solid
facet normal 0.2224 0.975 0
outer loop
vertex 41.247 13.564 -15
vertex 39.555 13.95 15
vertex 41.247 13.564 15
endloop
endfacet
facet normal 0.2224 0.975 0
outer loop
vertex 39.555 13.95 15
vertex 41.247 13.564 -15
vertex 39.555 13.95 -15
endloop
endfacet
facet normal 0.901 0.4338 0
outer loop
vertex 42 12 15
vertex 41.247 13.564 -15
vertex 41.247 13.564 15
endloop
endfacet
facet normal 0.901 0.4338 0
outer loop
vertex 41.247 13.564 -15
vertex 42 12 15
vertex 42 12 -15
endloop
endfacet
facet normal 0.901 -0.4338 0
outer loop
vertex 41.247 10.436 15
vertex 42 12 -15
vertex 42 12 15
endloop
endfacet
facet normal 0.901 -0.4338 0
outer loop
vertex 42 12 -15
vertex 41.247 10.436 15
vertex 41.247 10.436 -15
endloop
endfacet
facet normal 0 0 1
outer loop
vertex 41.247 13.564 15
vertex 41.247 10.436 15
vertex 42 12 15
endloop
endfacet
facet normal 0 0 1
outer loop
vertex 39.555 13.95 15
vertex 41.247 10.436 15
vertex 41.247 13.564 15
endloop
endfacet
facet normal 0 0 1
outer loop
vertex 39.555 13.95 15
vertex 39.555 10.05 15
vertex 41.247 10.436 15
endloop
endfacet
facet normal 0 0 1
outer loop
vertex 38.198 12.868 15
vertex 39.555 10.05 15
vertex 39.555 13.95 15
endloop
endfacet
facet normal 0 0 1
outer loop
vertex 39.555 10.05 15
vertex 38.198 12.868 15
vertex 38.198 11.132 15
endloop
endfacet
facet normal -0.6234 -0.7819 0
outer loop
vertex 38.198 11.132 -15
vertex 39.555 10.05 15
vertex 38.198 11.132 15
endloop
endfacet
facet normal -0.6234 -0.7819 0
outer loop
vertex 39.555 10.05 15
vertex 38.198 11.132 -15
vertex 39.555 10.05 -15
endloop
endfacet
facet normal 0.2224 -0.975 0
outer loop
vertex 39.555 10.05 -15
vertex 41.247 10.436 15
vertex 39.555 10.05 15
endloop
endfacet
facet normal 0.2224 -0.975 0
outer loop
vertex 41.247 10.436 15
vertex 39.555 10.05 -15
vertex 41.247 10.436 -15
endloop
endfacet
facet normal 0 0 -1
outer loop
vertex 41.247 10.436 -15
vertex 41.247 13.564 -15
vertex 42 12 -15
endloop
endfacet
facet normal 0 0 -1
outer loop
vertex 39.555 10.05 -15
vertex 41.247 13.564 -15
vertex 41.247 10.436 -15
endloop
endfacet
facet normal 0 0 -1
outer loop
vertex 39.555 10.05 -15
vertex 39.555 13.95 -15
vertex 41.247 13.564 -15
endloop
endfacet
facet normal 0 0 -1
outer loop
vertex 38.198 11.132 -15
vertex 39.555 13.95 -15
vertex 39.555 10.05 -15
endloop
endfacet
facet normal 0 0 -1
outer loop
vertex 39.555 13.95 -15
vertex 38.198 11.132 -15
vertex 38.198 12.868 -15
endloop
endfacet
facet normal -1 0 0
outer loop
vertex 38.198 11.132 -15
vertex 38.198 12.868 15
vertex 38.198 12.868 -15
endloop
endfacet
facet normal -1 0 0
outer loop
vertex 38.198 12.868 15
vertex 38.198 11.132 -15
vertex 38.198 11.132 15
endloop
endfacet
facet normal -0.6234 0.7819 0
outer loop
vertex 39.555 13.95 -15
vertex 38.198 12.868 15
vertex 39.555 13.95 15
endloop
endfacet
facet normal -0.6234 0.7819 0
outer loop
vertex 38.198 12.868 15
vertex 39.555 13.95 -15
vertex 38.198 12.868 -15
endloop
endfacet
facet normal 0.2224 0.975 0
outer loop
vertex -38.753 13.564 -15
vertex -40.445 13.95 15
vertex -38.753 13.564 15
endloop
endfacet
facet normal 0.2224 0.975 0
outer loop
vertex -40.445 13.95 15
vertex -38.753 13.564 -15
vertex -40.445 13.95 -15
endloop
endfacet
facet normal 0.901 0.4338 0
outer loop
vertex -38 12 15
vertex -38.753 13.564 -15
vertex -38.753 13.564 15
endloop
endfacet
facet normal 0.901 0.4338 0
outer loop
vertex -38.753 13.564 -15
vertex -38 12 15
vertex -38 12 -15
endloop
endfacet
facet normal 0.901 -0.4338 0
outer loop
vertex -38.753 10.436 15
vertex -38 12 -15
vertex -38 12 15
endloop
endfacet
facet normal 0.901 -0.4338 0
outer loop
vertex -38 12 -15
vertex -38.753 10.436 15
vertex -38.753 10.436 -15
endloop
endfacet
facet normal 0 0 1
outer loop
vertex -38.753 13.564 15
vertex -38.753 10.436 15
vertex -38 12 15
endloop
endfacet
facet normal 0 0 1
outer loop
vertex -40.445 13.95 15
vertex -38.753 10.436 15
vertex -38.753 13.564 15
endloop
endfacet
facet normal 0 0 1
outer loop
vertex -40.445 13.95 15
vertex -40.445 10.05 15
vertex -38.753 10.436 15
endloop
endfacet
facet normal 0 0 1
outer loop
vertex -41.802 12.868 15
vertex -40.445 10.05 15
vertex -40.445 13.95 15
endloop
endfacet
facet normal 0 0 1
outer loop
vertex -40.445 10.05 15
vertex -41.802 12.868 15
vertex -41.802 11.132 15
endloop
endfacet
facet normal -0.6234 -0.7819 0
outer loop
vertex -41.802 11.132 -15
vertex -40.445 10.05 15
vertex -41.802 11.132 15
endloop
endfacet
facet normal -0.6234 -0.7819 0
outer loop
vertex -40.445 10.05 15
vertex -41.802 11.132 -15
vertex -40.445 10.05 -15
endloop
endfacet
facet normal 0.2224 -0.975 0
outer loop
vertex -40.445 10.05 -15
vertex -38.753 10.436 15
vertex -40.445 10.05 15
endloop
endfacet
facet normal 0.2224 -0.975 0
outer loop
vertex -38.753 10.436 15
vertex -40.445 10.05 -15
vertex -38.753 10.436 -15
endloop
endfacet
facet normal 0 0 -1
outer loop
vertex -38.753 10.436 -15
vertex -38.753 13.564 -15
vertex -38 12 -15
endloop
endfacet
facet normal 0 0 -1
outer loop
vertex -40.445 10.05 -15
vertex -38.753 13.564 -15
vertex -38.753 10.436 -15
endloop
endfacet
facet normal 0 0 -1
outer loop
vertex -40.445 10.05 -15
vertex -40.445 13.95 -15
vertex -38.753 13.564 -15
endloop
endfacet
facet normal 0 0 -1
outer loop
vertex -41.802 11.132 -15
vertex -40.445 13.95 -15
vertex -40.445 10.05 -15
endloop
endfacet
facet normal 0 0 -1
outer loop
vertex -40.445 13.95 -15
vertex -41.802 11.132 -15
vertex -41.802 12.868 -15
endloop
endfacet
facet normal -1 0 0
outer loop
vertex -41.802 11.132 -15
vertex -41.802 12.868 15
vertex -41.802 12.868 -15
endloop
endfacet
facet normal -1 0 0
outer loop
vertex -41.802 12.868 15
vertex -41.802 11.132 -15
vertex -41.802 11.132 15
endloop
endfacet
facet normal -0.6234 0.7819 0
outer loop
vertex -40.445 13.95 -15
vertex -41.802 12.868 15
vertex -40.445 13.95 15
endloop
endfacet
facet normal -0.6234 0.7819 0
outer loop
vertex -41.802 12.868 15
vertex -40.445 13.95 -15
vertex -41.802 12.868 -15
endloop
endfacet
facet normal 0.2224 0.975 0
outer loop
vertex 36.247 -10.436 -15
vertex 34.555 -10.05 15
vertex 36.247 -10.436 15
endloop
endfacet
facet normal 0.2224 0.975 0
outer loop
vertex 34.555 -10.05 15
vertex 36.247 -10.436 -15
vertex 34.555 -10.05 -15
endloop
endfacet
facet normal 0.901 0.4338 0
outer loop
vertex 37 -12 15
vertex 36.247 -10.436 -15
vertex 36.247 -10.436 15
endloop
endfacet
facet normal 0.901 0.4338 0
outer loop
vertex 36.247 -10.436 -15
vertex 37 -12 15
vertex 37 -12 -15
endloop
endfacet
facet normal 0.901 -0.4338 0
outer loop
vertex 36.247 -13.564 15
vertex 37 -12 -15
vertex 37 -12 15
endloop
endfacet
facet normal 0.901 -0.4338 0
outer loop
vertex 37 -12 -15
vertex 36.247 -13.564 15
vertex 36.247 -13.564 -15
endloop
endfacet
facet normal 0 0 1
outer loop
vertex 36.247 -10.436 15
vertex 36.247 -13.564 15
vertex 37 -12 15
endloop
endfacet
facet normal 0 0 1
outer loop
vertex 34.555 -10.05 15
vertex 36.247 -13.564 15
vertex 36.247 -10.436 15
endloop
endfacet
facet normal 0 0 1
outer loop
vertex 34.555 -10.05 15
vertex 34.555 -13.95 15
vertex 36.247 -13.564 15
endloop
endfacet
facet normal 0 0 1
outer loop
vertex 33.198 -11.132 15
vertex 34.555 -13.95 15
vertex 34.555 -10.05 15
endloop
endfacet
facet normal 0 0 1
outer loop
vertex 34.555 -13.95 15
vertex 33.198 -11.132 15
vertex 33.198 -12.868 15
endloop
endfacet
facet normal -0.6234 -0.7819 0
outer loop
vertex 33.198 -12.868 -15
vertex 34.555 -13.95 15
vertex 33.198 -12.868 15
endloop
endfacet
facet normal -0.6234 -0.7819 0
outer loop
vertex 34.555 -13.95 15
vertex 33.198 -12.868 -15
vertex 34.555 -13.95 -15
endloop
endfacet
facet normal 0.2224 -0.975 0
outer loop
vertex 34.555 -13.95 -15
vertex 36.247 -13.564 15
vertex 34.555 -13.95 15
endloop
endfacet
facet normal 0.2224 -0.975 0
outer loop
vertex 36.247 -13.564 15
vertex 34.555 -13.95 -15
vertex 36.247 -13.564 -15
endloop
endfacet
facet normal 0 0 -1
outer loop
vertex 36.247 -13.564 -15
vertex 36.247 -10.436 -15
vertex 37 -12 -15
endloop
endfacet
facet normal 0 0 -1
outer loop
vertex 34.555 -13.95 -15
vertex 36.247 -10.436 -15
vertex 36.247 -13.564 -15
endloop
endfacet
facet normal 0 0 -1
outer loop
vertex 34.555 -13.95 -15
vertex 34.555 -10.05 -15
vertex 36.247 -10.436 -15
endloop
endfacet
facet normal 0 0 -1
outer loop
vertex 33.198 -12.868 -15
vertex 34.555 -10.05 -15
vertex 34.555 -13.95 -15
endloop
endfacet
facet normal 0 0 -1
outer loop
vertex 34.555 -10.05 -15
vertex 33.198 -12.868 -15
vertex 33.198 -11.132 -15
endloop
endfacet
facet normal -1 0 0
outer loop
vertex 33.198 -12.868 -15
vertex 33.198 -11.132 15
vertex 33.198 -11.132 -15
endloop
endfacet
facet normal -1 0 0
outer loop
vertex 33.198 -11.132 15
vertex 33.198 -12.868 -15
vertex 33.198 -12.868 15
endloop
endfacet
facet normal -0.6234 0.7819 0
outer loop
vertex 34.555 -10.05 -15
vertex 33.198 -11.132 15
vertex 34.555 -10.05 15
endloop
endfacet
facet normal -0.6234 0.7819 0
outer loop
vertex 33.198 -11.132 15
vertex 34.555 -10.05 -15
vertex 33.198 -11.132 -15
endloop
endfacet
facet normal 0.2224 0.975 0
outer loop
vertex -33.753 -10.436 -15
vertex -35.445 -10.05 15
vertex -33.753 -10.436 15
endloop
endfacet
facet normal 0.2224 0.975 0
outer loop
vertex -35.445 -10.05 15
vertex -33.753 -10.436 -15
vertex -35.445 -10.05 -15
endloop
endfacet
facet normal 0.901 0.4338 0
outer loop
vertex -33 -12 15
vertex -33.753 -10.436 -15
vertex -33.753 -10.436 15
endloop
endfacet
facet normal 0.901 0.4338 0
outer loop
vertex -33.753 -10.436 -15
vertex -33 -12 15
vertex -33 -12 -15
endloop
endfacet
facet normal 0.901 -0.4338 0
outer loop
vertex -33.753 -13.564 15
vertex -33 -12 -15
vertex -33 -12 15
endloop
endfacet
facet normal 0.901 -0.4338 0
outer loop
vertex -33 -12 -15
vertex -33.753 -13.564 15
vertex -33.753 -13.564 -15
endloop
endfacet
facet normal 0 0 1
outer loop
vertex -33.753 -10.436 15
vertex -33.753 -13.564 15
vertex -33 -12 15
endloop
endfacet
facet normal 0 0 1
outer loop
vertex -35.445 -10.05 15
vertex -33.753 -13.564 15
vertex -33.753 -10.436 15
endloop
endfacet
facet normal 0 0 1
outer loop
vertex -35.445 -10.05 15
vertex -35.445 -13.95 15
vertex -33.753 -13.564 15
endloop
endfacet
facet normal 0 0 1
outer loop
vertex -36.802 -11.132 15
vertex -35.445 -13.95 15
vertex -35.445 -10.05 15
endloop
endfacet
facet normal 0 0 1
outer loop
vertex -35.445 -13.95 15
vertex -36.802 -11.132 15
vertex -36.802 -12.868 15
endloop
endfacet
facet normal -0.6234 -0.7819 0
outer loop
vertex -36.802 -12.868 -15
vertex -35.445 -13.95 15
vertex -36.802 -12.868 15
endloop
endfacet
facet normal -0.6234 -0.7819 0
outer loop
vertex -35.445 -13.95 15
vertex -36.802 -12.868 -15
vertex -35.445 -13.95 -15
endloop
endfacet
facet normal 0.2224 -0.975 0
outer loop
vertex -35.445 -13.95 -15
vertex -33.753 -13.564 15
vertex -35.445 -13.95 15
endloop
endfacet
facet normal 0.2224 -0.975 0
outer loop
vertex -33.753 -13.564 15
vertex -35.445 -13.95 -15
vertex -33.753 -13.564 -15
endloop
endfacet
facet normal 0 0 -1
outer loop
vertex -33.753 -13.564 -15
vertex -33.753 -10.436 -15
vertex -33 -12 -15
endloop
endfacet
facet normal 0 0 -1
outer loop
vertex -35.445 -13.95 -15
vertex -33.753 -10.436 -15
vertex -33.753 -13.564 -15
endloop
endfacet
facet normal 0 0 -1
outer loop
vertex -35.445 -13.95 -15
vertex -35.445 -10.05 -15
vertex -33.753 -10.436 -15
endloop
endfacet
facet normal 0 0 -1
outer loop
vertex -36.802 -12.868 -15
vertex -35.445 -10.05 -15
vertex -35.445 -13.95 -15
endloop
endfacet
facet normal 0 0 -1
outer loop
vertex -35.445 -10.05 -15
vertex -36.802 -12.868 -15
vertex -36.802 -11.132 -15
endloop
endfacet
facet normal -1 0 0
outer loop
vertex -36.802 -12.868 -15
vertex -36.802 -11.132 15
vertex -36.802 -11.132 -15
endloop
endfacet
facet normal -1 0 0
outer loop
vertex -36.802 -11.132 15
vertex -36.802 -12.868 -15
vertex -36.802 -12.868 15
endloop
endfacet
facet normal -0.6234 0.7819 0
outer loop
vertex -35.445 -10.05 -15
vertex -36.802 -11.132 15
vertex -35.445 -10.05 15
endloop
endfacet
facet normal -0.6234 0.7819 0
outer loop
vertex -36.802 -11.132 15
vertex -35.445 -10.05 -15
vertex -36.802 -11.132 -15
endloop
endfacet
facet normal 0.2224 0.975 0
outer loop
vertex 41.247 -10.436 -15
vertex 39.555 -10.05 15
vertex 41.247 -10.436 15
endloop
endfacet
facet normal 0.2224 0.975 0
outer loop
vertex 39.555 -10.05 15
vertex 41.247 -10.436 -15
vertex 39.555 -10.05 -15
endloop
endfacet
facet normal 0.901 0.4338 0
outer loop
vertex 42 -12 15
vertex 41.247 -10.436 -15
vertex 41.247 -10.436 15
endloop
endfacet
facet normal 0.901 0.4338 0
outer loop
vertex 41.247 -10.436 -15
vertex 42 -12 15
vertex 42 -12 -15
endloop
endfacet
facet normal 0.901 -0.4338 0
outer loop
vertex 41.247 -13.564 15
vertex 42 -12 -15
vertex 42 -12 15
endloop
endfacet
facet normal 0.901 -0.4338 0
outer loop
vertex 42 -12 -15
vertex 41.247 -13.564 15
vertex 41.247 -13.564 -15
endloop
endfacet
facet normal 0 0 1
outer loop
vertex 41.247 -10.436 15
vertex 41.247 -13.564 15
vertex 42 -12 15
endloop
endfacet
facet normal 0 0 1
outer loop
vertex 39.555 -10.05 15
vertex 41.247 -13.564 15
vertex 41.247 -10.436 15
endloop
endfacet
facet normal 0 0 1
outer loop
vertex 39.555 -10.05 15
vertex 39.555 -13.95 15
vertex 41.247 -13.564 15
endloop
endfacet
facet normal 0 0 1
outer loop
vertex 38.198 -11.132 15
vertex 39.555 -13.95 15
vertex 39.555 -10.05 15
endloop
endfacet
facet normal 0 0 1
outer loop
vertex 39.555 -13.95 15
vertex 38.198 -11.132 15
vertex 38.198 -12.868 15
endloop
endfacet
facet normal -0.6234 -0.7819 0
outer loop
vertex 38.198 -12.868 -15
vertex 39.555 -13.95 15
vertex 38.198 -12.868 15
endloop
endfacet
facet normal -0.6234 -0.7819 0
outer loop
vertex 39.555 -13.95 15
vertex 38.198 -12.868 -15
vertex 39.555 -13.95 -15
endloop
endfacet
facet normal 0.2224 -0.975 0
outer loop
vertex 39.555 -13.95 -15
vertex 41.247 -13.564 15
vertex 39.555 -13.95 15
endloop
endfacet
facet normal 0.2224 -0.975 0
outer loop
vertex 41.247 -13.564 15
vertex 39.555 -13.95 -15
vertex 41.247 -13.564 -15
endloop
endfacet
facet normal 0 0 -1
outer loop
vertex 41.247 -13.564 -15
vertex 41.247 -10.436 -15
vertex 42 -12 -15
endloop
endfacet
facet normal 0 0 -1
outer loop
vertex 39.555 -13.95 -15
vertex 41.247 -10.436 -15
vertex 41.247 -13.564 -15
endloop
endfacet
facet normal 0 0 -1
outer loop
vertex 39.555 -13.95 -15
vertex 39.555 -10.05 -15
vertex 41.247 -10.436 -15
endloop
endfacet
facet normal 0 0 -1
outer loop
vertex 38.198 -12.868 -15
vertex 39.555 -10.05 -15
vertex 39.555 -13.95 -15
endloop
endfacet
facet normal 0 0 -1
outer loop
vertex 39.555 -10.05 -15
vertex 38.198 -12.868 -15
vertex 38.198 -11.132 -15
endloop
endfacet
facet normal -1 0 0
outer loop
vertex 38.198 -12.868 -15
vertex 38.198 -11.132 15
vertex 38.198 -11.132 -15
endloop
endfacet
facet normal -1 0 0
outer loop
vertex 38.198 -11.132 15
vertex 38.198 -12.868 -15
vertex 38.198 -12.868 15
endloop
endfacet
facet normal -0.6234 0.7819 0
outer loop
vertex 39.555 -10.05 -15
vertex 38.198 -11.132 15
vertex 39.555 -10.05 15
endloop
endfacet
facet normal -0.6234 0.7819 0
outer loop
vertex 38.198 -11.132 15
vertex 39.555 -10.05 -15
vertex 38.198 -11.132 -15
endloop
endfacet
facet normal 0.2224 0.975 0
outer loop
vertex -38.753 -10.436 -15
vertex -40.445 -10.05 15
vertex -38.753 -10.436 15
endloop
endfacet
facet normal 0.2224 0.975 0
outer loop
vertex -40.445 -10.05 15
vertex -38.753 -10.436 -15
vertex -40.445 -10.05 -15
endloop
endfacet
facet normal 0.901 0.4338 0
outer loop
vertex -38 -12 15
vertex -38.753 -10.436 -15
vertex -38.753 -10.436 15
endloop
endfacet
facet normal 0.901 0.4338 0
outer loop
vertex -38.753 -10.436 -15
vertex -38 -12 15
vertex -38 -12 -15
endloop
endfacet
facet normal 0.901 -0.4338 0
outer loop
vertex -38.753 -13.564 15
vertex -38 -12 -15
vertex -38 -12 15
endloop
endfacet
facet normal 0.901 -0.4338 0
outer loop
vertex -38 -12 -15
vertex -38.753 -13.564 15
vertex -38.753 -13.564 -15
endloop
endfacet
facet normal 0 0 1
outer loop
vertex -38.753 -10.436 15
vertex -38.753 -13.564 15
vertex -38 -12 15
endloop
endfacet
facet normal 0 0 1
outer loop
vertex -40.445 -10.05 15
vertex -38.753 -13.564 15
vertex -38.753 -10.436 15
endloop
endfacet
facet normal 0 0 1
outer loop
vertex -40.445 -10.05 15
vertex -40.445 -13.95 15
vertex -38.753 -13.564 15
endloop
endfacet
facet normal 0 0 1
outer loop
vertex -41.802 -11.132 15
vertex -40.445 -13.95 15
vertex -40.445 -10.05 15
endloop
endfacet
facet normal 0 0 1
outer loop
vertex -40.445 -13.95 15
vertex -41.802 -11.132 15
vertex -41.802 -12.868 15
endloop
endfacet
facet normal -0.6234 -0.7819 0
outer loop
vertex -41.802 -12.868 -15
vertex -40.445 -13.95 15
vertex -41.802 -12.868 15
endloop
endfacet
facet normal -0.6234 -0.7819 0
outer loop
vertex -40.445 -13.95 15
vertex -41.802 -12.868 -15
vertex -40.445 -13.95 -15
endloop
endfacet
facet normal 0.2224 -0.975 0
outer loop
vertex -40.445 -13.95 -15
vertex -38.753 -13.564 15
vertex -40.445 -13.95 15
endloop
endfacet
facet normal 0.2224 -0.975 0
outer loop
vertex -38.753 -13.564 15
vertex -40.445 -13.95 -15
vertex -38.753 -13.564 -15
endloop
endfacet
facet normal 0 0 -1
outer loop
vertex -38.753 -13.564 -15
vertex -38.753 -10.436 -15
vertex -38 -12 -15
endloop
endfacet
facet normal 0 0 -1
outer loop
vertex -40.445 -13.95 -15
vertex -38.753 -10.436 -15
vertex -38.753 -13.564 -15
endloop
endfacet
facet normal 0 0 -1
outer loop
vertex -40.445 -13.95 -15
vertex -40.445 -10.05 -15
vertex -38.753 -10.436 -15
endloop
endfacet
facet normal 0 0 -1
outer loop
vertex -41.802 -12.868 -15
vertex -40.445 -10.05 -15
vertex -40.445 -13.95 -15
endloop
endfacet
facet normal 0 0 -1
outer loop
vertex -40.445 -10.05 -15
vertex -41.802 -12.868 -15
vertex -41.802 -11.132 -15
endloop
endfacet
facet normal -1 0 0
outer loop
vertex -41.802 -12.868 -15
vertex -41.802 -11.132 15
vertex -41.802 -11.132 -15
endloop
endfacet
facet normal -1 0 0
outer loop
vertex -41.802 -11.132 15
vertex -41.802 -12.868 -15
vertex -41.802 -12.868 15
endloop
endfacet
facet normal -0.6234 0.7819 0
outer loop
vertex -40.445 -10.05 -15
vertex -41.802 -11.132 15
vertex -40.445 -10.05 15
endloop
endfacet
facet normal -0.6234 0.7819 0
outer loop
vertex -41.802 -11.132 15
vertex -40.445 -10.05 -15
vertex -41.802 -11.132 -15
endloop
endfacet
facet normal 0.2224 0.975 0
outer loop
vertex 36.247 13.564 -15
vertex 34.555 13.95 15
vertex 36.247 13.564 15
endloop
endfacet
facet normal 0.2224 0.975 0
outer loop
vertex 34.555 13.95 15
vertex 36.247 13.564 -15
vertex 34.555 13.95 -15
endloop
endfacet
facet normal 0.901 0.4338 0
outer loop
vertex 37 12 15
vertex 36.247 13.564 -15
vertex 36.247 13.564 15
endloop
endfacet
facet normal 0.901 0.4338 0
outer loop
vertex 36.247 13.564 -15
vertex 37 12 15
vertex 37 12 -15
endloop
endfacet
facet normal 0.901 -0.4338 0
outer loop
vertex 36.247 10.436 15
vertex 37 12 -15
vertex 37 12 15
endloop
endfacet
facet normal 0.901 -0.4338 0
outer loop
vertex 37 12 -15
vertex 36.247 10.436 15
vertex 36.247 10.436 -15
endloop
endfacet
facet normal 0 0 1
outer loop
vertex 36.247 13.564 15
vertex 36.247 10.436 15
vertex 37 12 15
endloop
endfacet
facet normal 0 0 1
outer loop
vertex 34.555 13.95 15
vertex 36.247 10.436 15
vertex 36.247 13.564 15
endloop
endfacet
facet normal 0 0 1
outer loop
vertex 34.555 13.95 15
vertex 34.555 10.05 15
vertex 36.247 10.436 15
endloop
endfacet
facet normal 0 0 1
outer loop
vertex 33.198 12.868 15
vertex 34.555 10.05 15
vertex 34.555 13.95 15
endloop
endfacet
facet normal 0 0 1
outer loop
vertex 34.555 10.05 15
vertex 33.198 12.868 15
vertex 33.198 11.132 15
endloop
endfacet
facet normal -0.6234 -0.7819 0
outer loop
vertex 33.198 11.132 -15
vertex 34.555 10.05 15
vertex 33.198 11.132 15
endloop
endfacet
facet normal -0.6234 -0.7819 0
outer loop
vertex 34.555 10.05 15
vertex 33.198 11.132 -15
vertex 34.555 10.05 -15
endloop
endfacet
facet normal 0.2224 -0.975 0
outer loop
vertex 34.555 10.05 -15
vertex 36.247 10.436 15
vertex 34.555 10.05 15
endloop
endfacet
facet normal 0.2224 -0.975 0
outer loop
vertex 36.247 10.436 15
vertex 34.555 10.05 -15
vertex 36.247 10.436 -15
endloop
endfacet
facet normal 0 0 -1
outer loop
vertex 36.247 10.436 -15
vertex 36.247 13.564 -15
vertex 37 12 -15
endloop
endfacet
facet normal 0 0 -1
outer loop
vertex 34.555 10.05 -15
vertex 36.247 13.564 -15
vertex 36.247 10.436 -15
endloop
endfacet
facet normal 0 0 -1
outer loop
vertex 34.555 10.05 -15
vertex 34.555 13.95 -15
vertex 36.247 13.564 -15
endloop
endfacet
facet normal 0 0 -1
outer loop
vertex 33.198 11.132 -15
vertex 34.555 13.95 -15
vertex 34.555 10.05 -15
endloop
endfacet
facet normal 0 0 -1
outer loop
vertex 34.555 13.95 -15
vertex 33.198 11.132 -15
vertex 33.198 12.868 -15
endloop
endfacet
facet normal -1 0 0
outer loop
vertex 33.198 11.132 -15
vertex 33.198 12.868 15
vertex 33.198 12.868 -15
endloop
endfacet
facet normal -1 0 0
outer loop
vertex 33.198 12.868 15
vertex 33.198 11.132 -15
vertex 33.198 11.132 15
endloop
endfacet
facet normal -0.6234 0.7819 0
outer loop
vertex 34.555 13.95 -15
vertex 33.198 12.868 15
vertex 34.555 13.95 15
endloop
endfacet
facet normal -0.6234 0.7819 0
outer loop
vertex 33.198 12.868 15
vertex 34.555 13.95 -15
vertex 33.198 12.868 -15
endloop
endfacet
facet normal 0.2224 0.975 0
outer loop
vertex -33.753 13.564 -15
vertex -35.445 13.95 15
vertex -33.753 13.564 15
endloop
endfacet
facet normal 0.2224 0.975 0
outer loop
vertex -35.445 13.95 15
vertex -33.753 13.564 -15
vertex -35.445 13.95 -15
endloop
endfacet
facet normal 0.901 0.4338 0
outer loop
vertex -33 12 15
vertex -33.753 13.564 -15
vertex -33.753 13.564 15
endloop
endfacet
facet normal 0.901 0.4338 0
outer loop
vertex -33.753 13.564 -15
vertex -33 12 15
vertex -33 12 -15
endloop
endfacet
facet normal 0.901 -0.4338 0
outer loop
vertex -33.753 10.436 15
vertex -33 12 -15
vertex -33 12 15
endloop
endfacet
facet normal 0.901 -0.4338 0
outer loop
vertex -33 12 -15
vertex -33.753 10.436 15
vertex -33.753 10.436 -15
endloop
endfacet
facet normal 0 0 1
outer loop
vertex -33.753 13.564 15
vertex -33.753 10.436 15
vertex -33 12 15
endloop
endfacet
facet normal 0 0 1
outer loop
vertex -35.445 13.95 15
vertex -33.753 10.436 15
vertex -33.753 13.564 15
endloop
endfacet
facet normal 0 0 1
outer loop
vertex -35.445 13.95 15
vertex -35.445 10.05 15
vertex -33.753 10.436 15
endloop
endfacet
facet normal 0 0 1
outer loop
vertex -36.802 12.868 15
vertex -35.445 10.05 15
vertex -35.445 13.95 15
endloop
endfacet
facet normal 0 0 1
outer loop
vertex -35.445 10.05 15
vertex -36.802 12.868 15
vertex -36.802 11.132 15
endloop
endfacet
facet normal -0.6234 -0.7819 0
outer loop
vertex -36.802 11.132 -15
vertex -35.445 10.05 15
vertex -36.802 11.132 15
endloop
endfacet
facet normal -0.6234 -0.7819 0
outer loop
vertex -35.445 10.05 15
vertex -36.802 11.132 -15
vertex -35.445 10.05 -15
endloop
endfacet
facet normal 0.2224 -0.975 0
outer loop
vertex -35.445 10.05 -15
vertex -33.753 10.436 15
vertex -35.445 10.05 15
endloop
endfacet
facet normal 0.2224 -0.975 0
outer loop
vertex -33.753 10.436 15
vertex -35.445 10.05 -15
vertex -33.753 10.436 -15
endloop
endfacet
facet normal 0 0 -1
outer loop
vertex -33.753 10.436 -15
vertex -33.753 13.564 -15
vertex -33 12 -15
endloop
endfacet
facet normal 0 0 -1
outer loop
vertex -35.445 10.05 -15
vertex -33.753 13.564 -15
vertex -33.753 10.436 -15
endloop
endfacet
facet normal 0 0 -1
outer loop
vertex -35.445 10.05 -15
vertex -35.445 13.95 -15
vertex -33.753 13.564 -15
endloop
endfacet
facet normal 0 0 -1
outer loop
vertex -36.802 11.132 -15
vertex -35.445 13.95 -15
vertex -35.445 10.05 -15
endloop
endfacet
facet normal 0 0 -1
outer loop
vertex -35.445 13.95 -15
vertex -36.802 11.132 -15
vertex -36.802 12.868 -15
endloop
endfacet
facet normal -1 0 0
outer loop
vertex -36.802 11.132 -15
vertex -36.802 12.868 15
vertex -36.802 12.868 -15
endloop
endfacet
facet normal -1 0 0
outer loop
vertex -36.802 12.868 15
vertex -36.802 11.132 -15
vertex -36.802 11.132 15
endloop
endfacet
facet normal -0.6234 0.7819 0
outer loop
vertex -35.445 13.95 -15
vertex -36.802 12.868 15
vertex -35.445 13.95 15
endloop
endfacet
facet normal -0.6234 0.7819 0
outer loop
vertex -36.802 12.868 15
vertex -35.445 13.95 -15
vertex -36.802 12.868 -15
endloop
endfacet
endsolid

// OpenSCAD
module upperScrewHoles(){
	//upperMiddleHalf
	translate([40,12,0]) cylinder(h=30,r=2,center=true);
	translate([-40,12,0]) cylinder(h=30,r=2,center=true);
	//upperHalf
	translate([35,-12,0]) cylinder(h=30,r=2,center=true);
	translate([-35,-12,0]) cylinder(h=30,r=2,center=true);
}

module lowerScrewHoles(){
	//lowerMiddleHalf
	translate([40,-12,0]) cylinder(h=30,r=2,center=true);
	translate([-40,-12,0]) cylinder(h=30,r=2,center=true);
	//bottomwHalf
	translate([35,12,0]) cylinder(h=30,r=2,center=true);
	translate([-35,12,0]) cylinder(h=30,r=2,center=true);
}

upperScrewHoles();
lowerScrewHoles();
